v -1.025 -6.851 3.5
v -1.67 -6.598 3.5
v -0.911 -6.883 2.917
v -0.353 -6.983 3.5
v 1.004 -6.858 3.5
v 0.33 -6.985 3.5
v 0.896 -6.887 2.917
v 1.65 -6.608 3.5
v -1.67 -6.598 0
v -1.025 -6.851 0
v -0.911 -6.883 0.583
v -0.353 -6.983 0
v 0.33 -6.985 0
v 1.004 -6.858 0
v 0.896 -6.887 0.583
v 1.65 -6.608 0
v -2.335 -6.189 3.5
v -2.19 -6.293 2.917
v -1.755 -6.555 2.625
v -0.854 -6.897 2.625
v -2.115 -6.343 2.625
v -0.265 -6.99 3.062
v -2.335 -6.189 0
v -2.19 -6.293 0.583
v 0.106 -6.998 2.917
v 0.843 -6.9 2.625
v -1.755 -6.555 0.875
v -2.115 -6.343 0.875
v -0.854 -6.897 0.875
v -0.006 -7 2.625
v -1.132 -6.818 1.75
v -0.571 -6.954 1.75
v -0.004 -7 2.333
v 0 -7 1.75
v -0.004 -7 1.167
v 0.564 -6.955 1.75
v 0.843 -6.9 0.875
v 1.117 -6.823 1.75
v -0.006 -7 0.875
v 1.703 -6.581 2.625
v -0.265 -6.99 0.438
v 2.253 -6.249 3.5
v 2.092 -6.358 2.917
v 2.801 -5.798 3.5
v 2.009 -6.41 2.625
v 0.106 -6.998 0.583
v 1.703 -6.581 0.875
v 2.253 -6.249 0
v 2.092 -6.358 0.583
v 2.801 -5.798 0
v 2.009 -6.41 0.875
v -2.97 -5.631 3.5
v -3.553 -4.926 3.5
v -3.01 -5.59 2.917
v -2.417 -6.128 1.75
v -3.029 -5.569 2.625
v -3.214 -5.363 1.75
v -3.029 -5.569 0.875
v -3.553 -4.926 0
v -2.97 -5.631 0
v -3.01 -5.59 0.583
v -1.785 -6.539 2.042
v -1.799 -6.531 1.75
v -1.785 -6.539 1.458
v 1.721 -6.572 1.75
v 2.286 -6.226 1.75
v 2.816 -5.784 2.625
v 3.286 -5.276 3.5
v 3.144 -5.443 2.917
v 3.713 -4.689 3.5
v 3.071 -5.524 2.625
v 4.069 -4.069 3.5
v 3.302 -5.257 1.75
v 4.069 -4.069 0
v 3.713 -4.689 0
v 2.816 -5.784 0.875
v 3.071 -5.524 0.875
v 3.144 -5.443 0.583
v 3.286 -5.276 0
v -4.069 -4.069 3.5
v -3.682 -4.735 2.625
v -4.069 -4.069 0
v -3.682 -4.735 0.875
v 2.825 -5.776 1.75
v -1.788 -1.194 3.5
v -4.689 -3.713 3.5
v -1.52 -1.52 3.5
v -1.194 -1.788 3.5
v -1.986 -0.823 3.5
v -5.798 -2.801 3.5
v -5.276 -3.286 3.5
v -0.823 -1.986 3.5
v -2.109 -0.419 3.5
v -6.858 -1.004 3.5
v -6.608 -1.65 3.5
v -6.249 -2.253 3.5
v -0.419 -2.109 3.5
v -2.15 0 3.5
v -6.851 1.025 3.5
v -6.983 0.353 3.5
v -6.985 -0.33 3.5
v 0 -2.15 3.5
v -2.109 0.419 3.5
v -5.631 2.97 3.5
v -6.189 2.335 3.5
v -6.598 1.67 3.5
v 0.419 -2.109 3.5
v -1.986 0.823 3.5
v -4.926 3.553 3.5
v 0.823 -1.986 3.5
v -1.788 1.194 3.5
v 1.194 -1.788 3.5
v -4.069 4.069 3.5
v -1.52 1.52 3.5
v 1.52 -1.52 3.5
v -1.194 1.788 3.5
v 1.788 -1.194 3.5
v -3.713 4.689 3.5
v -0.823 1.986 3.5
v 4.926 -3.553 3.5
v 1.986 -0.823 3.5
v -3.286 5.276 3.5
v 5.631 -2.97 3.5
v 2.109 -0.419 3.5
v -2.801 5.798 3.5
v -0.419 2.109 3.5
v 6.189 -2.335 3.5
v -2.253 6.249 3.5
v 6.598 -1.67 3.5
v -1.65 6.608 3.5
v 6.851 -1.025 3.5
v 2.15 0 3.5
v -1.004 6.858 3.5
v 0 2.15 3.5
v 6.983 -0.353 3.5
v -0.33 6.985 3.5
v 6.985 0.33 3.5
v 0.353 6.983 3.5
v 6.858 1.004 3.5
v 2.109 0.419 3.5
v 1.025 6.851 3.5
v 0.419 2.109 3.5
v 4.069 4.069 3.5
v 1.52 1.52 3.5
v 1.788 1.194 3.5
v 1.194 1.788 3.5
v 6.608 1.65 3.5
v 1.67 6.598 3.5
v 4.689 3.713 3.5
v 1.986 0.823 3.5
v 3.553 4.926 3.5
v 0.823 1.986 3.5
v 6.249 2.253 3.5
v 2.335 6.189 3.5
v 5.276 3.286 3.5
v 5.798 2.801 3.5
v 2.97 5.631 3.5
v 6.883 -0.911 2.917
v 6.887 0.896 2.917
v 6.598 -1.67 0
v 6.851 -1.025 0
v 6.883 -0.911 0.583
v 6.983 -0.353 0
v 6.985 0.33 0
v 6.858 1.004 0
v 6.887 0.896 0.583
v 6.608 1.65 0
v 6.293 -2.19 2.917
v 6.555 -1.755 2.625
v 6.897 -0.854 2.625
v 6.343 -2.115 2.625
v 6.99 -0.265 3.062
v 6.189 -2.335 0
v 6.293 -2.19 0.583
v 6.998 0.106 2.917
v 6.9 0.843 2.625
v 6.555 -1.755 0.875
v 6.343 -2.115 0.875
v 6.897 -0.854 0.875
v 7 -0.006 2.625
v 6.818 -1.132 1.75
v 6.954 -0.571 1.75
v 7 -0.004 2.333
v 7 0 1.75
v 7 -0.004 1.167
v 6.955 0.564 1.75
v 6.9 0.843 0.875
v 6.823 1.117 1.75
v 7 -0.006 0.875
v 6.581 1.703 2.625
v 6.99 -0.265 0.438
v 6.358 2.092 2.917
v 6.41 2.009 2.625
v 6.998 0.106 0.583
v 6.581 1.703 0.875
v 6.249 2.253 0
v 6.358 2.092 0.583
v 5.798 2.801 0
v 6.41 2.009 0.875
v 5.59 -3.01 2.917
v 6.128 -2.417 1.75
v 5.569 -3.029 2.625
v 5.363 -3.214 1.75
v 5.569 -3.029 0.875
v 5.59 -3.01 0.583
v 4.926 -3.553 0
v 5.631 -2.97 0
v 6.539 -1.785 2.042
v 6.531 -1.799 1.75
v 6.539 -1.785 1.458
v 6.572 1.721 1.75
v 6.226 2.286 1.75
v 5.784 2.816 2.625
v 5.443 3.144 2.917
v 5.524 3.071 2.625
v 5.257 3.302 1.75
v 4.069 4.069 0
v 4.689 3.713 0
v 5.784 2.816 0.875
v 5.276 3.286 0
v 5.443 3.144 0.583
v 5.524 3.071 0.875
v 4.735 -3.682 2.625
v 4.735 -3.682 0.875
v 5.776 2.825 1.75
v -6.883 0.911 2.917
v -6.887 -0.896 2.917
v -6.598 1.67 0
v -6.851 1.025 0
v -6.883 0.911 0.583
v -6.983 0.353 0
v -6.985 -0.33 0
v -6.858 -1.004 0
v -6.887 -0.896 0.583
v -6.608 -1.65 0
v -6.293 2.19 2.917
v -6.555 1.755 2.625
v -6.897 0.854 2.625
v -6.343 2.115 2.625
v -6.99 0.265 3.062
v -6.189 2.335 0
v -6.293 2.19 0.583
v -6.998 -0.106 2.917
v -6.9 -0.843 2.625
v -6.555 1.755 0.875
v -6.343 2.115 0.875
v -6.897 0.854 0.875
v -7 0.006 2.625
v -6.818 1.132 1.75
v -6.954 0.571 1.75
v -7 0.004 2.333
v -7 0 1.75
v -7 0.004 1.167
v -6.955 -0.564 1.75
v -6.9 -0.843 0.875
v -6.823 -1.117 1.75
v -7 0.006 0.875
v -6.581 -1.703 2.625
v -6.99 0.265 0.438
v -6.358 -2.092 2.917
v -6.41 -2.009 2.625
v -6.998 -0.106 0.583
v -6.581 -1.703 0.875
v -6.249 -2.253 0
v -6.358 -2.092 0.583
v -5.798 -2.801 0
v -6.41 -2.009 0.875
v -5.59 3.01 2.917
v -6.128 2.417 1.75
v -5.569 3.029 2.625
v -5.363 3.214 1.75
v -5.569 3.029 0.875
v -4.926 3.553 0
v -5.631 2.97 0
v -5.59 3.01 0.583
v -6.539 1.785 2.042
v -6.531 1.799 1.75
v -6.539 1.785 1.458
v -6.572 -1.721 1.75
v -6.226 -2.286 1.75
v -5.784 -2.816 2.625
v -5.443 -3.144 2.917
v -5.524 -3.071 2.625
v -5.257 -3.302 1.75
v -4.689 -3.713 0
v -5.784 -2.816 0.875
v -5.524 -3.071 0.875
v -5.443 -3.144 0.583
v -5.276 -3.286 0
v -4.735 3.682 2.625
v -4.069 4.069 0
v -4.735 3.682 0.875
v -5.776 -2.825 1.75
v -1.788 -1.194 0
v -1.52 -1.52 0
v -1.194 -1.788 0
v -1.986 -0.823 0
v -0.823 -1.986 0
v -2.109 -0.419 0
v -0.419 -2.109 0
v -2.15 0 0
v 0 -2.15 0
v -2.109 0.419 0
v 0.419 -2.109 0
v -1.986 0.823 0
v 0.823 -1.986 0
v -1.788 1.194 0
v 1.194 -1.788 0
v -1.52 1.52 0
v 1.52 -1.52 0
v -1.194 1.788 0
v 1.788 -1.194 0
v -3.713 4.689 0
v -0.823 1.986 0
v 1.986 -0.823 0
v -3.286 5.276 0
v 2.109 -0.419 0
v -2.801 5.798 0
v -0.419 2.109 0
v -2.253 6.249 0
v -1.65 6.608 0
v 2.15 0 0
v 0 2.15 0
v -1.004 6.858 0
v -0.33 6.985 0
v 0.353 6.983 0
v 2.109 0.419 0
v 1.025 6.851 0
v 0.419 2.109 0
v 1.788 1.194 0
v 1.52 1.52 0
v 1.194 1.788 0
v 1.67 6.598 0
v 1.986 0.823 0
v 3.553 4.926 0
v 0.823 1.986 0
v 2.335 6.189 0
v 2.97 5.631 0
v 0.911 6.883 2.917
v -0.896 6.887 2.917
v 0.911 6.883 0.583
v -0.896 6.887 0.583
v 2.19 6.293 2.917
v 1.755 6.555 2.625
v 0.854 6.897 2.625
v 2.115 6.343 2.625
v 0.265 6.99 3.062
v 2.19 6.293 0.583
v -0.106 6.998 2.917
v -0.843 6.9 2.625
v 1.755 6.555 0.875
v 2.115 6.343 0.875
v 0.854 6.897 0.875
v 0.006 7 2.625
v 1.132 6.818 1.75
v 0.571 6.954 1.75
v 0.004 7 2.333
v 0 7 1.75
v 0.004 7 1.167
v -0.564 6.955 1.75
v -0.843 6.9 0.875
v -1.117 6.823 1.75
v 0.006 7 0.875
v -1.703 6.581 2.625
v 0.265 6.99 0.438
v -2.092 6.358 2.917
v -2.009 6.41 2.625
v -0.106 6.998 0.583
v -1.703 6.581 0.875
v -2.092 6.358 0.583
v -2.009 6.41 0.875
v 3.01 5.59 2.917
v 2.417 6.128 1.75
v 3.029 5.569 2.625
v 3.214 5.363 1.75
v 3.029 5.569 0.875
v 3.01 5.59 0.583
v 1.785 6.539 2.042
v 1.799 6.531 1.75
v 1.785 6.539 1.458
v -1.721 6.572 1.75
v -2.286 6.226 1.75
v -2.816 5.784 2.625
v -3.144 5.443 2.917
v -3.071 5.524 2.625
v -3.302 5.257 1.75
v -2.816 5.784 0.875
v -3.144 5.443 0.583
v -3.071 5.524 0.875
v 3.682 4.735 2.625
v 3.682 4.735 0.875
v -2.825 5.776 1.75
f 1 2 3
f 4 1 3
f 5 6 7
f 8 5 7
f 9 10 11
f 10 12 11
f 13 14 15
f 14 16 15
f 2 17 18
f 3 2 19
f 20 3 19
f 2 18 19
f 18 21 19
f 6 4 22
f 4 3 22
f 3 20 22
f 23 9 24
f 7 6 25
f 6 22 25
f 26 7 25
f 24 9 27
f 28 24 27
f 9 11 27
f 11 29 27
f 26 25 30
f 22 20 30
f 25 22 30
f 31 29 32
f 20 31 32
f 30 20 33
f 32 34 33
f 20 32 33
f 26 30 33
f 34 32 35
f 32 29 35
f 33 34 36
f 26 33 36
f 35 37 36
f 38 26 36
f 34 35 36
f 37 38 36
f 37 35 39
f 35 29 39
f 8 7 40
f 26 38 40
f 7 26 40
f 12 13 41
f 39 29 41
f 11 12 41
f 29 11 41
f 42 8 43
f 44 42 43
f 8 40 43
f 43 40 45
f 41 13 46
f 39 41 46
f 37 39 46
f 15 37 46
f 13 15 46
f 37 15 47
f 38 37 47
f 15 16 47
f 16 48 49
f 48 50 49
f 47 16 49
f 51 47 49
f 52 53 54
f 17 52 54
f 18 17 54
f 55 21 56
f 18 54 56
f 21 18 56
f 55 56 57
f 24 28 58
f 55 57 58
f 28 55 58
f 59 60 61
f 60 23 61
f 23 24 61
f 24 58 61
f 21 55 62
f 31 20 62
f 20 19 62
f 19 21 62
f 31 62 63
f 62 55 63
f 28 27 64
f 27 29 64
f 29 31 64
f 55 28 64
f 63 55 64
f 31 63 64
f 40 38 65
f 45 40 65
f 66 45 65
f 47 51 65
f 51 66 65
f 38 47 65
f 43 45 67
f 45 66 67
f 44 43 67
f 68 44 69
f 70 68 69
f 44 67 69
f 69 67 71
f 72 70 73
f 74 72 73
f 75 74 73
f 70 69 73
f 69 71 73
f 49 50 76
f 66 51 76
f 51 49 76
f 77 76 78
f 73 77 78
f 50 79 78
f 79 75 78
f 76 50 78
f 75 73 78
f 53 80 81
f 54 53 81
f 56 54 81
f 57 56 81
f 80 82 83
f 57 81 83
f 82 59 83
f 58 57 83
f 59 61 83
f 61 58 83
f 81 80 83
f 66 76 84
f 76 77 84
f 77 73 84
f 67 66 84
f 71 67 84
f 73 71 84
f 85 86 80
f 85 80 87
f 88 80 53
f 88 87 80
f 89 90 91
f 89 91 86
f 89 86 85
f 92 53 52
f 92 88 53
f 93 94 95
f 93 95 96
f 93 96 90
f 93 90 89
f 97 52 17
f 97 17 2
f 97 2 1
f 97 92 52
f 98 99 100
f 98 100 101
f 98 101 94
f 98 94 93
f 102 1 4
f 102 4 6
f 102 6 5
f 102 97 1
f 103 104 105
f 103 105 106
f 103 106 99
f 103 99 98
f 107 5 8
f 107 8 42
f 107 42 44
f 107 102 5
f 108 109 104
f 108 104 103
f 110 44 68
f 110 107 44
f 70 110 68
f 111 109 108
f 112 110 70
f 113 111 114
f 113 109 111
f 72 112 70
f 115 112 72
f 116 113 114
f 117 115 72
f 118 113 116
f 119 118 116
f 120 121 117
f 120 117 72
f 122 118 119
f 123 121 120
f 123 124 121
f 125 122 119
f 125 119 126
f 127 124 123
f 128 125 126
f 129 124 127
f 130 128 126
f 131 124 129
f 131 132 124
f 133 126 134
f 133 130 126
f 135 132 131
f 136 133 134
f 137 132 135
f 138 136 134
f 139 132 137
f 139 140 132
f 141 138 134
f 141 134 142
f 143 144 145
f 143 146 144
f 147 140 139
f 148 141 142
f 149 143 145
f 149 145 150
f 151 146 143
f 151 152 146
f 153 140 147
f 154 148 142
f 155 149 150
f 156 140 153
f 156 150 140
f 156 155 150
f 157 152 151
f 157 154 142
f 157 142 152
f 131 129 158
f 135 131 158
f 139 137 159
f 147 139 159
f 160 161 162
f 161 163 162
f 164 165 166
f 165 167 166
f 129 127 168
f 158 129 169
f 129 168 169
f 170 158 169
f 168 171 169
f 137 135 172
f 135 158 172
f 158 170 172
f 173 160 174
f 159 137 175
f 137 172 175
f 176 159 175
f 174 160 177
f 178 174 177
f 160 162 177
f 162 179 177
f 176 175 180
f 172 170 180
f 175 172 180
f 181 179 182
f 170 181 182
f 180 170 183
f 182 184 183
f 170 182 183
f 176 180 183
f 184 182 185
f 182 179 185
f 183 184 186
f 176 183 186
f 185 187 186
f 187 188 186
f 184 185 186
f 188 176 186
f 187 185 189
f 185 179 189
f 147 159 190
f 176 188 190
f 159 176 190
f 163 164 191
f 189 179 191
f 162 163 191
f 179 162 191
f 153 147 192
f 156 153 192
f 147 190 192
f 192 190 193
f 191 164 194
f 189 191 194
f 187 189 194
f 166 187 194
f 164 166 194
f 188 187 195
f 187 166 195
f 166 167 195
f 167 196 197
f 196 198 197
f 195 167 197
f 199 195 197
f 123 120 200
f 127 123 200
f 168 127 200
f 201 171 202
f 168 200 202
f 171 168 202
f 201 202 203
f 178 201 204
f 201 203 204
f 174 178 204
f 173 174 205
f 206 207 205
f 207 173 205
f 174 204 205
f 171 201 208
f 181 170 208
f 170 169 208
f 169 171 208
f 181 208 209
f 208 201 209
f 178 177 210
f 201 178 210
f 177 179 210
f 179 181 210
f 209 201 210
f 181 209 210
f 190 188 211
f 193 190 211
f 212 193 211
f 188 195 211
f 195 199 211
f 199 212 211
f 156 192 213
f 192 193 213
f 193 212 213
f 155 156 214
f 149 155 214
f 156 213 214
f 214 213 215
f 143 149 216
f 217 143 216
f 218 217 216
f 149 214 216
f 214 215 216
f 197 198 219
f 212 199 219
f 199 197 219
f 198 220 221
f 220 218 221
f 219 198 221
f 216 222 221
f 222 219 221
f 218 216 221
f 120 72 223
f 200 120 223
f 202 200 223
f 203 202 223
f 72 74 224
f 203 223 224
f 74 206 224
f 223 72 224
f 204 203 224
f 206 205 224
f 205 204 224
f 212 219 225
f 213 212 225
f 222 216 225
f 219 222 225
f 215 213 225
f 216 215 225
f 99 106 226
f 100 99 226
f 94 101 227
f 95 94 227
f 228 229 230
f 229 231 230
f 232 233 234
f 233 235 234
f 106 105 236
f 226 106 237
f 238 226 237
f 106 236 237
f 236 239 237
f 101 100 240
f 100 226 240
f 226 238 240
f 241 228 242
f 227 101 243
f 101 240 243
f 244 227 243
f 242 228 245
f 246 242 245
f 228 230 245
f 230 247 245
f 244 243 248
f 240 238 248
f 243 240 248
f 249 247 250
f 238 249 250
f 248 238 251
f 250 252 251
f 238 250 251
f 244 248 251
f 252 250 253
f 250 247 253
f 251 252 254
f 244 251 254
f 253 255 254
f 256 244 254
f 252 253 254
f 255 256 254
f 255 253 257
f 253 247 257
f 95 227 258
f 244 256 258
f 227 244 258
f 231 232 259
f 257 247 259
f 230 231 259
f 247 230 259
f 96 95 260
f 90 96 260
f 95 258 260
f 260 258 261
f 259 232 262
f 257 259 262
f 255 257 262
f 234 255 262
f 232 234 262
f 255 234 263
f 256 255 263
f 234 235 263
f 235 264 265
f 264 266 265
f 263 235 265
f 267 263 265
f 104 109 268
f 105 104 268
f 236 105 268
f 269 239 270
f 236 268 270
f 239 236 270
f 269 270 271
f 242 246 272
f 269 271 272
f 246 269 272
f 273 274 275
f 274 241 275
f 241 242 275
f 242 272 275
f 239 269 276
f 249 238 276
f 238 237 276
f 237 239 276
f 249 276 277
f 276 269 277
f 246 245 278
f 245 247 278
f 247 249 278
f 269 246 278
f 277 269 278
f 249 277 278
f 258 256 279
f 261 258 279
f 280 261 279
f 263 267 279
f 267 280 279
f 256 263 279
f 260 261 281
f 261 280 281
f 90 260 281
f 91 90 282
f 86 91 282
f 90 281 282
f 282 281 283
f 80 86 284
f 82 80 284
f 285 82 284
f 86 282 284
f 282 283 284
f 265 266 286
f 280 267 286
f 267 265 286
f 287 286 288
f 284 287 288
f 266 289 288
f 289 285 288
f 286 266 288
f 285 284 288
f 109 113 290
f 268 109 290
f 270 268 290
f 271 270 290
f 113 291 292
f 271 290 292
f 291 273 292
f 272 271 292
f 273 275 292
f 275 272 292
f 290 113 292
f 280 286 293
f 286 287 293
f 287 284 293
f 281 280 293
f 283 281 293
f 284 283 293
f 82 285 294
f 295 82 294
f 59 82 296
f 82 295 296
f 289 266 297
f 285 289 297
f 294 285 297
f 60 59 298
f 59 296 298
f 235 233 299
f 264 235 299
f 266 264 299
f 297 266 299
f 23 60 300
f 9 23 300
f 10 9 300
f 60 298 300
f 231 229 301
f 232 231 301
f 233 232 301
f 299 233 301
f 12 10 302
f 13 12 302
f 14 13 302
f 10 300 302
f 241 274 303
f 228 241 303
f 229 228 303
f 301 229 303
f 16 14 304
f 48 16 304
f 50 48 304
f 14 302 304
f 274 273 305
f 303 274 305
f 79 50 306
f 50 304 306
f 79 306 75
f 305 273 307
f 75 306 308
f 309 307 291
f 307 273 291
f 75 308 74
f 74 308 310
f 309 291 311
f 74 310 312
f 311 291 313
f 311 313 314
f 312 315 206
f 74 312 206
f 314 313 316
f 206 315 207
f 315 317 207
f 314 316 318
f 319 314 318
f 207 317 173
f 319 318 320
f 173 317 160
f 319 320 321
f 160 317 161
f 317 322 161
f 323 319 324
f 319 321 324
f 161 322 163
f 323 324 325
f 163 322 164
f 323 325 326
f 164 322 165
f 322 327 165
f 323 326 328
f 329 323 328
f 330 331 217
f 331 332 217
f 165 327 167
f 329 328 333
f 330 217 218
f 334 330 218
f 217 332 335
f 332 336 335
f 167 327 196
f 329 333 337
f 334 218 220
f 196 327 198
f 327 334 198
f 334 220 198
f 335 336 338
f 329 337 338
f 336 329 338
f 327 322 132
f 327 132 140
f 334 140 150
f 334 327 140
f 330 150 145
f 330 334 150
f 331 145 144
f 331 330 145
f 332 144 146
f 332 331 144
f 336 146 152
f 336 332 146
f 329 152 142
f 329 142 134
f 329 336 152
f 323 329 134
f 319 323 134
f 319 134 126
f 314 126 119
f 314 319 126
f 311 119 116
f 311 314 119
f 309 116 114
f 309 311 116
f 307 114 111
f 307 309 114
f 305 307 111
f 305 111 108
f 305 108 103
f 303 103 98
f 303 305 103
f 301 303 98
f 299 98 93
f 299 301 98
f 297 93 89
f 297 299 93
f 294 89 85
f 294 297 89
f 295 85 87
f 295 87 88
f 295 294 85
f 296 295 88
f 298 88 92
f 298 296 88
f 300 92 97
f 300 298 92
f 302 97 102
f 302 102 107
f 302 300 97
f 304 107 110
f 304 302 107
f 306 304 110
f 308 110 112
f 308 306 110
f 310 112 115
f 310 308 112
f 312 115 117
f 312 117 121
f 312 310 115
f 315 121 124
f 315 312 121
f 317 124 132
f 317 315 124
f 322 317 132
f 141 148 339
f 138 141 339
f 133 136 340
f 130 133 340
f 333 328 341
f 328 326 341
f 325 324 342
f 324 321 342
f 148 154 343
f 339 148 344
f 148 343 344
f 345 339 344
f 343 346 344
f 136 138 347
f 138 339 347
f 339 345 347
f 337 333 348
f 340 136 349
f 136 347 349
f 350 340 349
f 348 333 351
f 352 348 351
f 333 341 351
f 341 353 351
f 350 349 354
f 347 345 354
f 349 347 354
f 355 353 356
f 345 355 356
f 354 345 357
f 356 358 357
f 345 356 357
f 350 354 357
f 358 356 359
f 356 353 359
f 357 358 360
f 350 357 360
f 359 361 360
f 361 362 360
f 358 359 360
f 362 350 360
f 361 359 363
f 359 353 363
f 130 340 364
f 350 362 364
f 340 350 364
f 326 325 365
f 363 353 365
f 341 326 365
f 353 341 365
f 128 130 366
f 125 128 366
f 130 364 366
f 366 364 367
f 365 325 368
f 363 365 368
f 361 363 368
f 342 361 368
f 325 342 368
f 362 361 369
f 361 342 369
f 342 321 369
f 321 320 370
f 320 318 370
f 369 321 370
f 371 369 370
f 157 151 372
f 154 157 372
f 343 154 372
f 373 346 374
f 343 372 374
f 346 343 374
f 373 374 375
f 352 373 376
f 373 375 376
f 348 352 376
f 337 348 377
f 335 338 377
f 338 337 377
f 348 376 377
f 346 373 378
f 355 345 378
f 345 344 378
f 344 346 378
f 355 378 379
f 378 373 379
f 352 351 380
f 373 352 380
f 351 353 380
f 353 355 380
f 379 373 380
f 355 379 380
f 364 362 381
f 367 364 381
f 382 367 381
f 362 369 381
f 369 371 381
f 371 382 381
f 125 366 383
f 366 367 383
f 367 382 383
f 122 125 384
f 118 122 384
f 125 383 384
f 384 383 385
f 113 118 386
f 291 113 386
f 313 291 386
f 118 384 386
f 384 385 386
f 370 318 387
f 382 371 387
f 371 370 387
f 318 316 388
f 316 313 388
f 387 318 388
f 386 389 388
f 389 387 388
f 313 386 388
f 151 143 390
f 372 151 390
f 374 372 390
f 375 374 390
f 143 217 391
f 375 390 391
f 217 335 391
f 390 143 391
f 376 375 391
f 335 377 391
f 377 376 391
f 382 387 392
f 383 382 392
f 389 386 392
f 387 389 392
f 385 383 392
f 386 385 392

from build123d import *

# Parameters (mm, degrees)
F0_R     = 3.5
F0_R_2   = 2.15
F1_DEPTH = 3.5


with BuildPart() as f1:
    # F0 (on Top) → F1 (new body)
    with BuildSketch(Plane.XY):
        with BuildLine():
            add(Edge.make_bspline(
                [(-4.068667356, 4.068667356), (-5, 2.2432553739), (-5, 0)],
                knots=[4.0921394944, 4.0921394944, 4.0921394944, 4.7123889804, 4.7123889804, 4.7123889804], degree=2, weights=[1, 0.9522955085, 1]))
            add(Edge.make_bspline(
                [(-5, 0), (-5, -2.2432553739), (-4.068667356, -4.068667356)],
                knots=[4.7123889804, 4.7123889804, 4.7123889804, 5.3326384664, 5.3326384664, 5.3326384664], degree=2, weights=[1, 0.9522955085, 1]))
            add(Edge.make_bspline(
                [(-4.068667356, -4.068667356), (0, -6.1445180479), (4.068667356, -4.068667356)],
                knots=[0.9505468408, 0.9505468408, 0.9505468408, 2.1910458128, 2.1910458128, 2.1910458128], degree=2, weights=[1, 0.8137334712, 1]))
            add(Edge.make_bspline(
                [(4.068667356, -4.068667356), (6.1445180479, 0), (4.068667356, 4.068667356)],
                knots=[0.9505468408, 0.9505468408, 0.9505468408, 2.1910458128, 2.1910458128, 2.1910458128], degree=2, weights=[1, 0.8137334712, 1]))
            add(Edge.make_bspline(
                [(4.068667356, 4.068667356), (2.2432553739, 5), (0, 5)],
                knots=[4.0921394944, 4.0921394944, 4.0921394944, 4.7123889804, 4.7123889804, 4.7123889804], degree=2, weights=[1, 0.9522955085, 1]))
            add(Edge.make_bspline(
                [(0, 5), (-2.2432553739, 5), (-4.068667356, 4.068667356)],
                knots=[4.7123889804, 4.7123889804, 4.7123889804, 5.3326384664, 5.3326384664, 5.3326384664], degree=2, weights=[1, 0.9522955085, 1]))
        make_face()
        Circle(F0_R, mode=Mode.SUBTRACT)
        with BuildLine():
            add(Edge.make_bspline(
                [(-5, 0), (-5, -2.2432553739), (-4.068667356, -4.068667356)],
                knots=[4.7123889804, 4.7123889804, 4.7123889804, 5.3326384664, 5.3326384664, 5.3326384664], degree=2, weights=[1, 0.9522955085, 1]))
            add(Edge.make_bspline(
                [(-4.068667356, 4.068667356), (-5, 2.2432553739), (-5, 0)],
                knots=[4.0921394944, 4.0921394944, 4.0921394944, 4.7123889804, 4.7123889804, 4.7123889804], degree=2, weights=[1, 0.9522955085, 1]))
            add(Edge.make_bspline(
                [(-4.068667356, 4.068667356), (-12.0432553739, 0), (-4.068667356, -4.068667356)],
                knots=[5.3326384664, 5.3326384664, 5.3326384664, 7.233732148, 7.233732148, 7.233732148], degree=2, weights=[1, 0.5812381937, 1]))
        make_face()
        with BuildLine():
            add(Edge.make_bspline(
                [(-4.068667356, -4.068667356), (0, -6.1445180479), (4.068667356, -4.068667356)],
                knots=[0.9505468408, 0.9505468408, 0.9505468408, 2.1910458128, 2.1910458128, 2.1910458128], degree=2, weights=[1, 0.8137334712, 1]))
            add(Edge.make_bspline(
                [(-4.068667356, -4.068667356), (0, -12.0432553739), (4.068667356, -4.068667356)],
                knots=[5.3326384664, 5.3326384664, 5.3326384664, 7.233732148, 7.233732148, 7.233732148], degree=2, weights=[1, 0.5812381937, 1]))
        make_face()
        with BuildLine():
            add(Edge.make_bspline(
                [(4.068667356, 4.068667356), (0, 12.0432553739), (-4.068667356, 4.068667356)],
                knots=[2.1910458128, 2.1910458128, 2.1910458128, 4.0921394944, 4.0921394944, 4.0921394944], degree=2, weights=[1, 0.5812381937, 1]))
            add(Edge.make_bspline(
                [(0, 5), (-2.2432553739, 5), (-4.068667356, 4.068667356)],
                knots=[4.7123889804, 4.7123889804, 4.7123889804, 5.3326384664, 5.3326384664, 5.3326384664], degree=2, weights=[1, 0.9522955085, 1]))
            add(Edge.make_bspline(
                [(4.068667356, 4.068667356), (2.2432553739, 5), (0, 5)],
                knots=[4.0921394944, 4.0921394944, 4.0921394944, 4.7123889804, 4.7123889804, 4.7123889804], degree=2, weights=[1, 0.9522955085, 1]))
        make_face()
        with BuildLine():
            add(Edge.make_bspline(
                [(4.068667356, -4.068667356), (6.1445180479, 0), (4.068667356, 4.068667356)],
                knots=[0.9505468408, 0.9505468408, 0.9505468408, 2.1910458128, 2.1910458128, 2.1910458128], degree=2, weights=[1, 0.8137334712, 1]))
            add(Edge.make_bspline(
                [(4.068667356, -4.068667356), (12.0432553739, 0), (4.068667356, 4.068667356)],
                knots=[2.1910458128, 2.1910458128, 2.1910458128, 4.0921394944, 4.0921394944, 4.0921394944], degree=2, weights=[1, 0.5812381937, 1]))
        make_face()
        Circle(F0_R)
        Circle(F0_R_2, mode=Mode.SUBTRACT)
    extrude(amount=F1_DEPTH)


solid = f1.part
